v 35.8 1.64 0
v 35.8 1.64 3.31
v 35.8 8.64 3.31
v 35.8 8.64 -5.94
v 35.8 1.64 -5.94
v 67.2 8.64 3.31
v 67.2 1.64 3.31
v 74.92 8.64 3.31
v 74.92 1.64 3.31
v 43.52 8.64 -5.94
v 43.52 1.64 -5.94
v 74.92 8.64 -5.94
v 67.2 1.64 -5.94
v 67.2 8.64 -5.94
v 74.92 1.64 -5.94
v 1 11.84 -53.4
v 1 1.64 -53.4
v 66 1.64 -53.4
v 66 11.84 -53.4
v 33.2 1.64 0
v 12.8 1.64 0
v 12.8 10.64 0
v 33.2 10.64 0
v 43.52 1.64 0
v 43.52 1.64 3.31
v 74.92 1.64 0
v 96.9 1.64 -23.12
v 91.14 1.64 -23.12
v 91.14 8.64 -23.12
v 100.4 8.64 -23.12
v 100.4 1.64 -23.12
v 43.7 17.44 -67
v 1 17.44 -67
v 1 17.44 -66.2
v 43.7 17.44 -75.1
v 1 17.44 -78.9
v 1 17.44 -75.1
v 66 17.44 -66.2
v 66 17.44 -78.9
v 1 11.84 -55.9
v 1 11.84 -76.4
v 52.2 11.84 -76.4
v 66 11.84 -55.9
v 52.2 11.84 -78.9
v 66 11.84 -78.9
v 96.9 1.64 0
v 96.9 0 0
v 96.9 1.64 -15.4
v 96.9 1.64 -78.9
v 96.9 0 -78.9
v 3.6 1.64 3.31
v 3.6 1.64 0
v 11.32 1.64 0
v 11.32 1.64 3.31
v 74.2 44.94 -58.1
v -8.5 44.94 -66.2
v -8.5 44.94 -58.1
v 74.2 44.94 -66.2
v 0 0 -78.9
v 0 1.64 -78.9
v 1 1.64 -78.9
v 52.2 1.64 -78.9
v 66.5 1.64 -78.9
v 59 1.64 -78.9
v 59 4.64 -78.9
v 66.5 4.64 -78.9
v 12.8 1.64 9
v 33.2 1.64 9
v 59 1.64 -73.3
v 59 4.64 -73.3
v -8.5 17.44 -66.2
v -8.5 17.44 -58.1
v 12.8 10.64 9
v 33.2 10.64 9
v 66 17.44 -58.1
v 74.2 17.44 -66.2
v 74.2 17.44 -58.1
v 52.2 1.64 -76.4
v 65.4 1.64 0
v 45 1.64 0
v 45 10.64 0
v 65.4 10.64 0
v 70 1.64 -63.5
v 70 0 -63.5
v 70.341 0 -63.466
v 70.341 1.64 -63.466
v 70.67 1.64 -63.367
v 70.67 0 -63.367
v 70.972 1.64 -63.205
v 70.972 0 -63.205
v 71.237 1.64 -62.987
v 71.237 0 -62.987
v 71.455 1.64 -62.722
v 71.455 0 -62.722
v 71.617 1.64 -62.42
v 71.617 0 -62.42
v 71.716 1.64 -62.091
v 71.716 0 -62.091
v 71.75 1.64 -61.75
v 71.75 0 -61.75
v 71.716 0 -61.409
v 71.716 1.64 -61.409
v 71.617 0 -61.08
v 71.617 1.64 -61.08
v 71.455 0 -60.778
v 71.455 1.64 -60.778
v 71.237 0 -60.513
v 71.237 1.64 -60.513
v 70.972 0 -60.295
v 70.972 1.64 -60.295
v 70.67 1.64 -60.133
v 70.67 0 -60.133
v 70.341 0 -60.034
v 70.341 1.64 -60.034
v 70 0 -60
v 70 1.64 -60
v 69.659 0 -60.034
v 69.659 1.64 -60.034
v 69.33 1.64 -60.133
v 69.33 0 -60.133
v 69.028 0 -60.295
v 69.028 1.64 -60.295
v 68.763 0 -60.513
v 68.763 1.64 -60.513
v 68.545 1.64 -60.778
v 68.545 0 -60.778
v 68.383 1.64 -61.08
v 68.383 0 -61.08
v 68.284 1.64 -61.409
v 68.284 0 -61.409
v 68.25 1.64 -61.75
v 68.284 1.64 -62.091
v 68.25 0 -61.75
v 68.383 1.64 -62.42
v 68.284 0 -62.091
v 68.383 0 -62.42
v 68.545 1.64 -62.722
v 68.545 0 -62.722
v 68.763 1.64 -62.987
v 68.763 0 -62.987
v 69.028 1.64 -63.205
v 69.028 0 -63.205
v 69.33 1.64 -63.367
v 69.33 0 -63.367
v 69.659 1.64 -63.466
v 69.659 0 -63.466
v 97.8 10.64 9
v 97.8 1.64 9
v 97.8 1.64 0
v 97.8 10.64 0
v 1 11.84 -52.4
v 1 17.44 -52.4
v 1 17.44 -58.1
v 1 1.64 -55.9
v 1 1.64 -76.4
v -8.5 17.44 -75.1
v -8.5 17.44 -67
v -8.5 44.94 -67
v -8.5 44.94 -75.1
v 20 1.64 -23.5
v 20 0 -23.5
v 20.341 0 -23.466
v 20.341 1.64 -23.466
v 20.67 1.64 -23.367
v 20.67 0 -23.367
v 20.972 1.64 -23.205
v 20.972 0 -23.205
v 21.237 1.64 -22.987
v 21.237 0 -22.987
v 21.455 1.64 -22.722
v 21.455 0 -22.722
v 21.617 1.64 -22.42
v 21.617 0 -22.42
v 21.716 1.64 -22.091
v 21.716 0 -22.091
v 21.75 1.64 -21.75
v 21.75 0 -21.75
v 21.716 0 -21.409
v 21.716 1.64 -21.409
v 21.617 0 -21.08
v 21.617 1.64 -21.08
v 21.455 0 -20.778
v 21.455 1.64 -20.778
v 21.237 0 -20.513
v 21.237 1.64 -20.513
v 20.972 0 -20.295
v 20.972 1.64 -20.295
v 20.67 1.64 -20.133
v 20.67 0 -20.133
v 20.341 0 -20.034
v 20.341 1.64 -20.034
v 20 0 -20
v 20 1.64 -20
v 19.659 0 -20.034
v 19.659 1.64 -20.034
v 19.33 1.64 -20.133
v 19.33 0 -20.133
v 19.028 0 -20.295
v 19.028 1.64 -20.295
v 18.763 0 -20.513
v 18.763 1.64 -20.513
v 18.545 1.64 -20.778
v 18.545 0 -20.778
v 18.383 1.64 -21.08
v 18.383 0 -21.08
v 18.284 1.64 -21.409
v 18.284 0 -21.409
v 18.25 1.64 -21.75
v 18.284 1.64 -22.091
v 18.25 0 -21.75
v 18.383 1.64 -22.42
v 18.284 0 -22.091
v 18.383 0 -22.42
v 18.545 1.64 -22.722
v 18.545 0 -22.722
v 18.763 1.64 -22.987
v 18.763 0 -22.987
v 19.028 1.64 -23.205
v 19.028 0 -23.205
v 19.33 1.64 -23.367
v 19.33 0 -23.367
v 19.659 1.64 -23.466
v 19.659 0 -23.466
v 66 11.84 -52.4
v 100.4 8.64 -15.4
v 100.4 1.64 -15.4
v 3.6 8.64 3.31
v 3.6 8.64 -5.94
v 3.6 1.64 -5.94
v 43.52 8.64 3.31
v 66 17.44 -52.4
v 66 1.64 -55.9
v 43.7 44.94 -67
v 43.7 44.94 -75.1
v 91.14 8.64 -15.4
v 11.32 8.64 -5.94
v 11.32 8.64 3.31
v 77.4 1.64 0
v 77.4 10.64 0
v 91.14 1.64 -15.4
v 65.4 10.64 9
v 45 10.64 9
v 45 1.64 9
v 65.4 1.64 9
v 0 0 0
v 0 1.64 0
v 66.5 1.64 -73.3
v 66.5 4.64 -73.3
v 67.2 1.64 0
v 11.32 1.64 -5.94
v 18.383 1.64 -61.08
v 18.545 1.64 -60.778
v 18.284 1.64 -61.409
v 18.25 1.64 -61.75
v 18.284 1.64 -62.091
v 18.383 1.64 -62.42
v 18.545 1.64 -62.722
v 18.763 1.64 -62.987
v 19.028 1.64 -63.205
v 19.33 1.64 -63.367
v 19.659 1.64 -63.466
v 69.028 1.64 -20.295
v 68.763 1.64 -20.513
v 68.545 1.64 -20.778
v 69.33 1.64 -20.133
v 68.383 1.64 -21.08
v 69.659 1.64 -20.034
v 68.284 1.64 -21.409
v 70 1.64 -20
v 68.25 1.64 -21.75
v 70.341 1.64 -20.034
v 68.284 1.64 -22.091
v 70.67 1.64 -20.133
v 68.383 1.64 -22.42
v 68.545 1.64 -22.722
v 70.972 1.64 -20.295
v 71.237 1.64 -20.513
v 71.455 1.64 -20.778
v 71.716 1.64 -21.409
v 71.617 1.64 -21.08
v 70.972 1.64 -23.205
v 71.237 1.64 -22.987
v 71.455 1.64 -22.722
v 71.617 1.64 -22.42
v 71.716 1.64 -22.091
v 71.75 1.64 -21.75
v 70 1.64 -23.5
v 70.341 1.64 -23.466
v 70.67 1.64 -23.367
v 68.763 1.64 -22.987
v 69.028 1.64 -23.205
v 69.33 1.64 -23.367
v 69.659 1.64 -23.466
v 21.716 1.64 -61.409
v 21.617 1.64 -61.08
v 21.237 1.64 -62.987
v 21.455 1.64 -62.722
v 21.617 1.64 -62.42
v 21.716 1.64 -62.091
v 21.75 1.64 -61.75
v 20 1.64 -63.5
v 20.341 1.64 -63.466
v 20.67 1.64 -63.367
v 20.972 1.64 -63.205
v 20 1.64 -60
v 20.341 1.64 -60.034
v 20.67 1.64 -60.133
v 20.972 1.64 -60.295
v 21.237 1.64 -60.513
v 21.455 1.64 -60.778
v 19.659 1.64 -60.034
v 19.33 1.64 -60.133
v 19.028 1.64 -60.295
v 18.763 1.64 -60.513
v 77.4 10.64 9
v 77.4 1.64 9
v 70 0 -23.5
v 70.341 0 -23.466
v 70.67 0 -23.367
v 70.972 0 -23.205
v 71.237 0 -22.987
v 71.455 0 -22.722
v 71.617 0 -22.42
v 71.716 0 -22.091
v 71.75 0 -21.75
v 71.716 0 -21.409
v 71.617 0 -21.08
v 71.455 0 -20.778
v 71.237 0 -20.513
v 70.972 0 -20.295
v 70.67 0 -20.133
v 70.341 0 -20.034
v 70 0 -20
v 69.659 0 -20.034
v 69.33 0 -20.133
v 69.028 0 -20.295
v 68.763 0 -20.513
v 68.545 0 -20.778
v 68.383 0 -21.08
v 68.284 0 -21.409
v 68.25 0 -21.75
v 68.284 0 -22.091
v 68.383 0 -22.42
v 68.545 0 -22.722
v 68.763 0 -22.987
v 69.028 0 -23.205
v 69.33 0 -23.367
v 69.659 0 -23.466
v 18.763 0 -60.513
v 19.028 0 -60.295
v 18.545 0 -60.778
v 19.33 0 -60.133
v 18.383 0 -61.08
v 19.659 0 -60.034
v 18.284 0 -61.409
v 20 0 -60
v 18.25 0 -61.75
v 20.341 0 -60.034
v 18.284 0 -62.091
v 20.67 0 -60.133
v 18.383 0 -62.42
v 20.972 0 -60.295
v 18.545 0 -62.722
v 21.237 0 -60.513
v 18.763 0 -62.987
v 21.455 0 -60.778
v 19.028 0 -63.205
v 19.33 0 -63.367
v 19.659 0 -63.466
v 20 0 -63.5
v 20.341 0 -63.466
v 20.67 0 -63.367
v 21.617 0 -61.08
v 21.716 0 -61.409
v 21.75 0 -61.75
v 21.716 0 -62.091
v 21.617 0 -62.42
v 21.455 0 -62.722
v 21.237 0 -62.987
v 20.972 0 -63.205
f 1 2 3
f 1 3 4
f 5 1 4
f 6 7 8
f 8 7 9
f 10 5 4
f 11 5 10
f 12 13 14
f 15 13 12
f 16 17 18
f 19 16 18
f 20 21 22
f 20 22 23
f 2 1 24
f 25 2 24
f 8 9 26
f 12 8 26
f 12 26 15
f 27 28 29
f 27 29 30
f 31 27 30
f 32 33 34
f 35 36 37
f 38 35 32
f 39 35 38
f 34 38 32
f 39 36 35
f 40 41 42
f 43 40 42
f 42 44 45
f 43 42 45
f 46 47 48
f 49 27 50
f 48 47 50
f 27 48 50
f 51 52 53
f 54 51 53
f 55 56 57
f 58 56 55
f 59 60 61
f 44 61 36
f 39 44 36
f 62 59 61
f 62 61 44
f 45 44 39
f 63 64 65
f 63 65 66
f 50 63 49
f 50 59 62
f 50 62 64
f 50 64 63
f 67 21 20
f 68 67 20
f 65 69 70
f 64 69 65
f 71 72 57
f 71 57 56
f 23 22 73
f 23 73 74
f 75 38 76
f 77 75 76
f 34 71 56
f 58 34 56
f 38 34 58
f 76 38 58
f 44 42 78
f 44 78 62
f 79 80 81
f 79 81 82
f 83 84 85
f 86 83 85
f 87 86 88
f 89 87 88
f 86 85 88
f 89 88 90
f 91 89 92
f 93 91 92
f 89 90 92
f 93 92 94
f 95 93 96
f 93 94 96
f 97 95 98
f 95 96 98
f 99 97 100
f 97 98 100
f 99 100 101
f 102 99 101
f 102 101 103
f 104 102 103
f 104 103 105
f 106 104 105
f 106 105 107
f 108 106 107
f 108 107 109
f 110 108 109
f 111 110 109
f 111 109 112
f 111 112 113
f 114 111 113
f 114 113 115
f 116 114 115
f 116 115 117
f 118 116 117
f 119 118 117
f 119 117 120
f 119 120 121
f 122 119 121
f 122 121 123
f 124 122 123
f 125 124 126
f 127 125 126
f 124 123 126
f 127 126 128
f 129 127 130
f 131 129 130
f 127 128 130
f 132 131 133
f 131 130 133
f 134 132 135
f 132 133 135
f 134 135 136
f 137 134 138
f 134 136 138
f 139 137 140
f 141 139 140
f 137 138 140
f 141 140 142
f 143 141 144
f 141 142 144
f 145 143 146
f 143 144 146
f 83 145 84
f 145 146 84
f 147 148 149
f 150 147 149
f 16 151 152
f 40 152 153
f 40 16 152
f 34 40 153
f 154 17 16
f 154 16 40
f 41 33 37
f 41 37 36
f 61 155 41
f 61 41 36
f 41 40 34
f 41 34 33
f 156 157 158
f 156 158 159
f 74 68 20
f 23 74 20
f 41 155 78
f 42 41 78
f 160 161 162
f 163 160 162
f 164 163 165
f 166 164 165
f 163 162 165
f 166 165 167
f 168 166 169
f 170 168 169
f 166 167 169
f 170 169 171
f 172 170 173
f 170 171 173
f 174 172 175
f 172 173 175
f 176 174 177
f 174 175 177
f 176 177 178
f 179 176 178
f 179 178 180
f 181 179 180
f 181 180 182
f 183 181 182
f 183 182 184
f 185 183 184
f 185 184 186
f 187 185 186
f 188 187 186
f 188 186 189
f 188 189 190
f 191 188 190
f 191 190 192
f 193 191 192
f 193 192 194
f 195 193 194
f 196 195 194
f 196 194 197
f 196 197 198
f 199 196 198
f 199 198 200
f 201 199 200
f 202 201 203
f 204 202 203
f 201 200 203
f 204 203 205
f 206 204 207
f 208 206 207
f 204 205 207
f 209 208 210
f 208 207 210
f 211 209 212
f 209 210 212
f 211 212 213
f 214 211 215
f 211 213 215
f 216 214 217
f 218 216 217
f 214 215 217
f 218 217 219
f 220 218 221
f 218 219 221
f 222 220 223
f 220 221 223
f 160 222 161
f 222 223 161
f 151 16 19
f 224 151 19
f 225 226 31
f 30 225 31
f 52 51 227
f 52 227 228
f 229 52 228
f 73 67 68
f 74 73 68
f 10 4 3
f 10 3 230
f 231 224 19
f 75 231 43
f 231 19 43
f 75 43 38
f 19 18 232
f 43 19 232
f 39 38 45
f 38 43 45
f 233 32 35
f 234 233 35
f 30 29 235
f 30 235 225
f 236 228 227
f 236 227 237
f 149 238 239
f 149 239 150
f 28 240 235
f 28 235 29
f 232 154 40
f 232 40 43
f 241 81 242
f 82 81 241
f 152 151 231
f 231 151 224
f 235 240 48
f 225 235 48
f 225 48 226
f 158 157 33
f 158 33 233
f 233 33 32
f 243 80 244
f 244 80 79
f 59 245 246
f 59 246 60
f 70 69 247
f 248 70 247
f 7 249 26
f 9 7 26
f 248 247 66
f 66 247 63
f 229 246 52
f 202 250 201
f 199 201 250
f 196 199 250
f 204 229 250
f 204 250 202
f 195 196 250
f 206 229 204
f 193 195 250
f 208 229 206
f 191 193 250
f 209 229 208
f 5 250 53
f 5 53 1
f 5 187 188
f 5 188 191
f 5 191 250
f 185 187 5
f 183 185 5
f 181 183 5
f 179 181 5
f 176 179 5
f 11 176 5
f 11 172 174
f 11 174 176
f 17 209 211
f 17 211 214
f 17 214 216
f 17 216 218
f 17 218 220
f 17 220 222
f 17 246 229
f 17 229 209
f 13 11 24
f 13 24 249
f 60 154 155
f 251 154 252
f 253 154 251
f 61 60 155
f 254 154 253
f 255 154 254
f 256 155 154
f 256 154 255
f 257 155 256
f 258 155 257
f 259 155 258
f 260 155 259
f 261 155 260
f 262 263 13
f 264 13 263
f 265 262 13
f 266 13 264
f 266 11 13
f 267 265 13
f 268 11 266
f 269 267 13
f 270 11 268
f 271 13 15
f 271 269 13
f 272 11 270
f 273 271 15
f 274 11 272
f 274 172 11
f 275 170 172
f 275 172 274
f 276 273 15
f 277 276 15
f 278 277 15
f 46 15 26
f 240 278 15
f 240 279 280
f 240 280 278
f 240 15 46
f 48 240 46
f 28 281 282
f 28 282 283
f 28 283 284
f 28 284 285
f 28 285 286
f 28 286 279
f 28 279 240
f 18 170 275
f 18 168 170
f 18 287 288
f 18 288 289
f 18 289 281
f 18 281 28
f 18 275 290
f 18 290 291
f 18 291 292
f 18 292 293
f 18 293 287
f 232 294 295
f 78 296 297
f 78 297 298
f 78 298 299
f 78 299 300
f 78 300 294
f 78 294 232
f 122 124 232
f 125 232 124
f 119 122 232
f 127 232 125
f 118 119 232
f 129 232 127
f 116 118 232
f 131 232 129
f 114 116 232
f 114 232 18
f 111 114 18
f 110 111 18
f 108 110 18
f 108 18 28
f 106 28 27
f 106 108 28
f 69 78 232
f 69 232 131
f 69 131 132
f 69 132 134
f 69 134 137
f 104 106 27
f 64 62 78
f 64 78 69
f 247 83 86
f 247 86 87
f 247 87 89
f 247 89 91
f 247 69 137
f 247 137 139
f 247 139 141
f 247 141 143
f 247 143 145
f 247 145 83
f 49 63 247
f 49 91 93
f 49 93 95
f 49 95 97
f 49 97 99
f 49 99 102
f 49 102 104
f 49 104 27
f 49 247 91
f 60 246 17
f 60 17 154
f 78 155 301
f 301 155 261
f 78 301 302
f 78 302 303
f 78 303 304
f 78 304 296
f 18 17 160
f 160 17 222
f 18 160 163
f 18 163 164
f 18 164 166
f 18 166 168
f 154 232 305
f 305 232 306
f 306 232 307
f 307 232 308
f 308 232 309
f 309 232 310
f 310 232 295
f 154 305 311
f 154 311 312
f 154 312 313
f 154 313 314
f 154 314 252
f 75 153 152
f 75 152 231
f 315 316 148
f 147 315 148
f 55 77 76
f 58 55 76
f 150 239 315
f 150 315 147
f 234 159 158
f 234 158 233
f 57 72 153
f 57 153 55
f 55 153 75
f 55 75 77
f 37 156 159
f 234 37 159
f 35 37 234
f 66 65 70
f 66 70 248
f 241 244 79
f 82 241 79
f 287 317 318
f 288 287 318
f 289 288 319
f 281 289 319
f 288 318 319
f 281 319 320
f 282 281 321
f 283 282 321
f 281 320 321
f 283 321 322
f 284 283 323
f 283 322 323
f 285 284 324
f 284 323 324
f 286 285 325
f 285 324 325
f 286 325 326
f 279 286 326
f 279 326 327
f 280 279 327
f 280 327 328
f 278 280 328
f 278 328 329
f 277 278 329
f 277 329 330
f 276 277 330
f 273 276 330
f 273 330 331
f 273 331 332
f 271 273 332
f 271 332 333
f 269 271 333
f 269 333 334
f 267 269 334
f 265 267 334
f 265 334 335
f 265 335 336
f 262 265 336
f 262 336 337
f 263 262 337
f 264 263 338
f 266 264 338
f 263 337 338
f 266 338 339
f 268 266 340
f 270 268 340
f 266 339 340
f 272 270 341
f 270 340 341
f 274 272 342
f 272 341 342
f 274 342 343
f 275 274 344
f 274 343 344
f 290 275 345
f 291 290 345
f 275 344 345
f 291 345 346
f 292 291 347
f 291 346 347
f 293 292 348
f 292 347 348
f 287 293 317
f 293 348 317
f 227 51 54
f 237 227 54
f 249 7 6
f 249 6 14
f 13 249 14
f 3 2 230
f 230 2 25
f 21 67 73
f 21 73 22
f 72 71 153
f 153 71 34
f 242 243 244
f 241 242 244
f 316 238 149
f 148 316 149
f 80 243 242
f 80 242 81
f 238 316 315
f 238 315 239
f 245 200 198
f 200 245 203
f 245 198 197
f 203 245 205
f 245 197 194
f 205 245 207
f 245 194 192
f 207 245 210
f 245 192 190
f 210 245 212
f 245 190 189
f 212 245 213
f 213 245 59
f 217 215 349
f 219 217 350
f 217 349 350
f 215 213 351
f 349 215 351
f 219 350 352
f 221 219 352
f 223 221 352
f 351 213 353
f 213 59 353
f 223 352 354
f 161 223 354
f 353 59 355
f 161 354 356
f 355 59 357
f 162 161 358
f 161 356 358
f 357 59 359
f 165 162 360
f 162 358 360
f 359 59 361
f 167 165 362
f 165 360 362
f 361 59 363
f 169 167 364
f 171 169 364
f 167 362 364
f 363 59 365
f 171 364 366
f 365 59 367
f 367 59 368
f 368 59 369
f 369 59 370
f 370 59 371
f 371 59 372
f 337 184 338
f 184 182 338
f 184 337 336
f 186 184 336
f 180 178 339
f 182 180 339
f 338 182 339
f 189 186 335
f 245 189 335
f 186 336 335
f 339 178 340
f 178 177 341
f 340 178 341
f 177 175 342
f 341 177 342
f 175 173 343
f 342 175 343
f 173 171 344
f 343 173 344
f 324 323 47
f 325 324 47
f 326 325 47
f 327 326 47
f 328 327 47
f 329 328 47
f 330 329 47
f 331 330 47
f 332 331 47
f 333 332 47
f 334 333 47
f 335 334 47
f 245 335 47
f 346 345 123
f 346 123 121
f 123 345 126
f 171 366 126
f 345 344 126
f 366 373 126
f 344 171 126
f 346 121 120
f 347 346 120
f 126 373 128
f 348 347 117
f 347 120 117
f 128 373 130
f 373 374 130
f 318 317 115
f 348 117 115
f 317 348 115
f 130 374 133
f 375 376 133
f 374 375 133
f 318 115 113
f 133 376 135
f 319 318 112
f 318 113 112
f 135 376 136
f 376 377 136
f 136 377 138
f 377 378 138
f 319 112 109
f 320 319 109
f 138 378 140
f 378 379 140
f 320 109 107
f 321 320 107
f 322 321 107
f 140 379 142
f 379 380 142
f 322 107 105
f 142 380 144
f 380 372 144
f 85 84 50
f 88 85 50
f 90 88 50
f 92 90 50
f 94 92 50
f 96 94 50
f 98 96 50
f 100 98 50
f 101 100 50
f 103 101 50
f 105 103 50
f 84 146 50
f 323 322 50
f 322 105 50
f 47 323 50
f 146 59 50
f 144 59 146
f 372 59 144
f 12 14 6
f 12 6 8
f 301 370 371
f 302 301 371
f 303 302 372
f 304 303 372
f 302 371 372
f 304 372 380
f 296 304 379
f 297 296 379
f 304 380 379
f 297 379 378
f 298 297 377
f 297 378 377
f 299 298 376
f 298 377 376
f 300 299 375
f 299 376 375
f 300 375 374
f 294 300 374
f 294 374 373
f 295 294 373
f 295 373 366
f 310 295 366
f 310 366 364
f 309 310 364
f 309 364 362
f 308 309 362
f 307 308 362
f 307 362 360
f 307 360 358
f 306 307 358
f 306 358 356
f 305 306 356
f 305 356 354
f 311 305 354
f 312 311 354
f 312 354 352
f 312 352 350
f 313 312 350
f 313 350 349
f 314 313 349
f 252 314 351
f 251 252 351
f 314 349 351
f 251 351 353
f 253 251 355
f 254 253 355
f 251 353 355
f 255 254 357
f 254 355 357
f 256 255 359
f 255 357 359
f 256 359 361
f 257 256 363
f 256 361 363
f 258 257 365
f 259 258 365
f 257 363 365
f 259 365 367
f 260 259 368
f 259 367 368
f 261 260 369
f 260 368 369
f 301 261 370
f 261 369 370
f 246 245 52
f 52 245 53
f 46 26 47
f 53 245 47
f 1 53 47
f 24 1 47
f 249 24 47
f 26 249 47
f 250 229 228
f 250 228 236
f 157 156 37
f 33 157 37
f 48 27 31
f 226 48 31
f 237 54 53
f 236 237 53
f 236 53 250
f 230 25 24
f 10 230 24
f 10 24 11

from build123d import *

# Parameters (mm, degrees)
SKETCH1_W             = 96.9
SKETCH1_H             = 78.9
BOSS_EXTRUDE1_DEPTH   = 1.64
SKETCH2_W             = 7.72
SKETCH2_H             = 9.25
SKETCH2_W_2           = 9.26
SKETCH2_H_2           = 7.72
BOSS_EXTRUDE2_DEPTH   = 7
SKETCH3_W             = 20.4
SKETCH3_H             = 9
BOSS_EXTRUDE5_DEPTH   = 9
BOSS_EXTRUDE5_2_DEPTH = 9
BOSS_EXTRUDE5_3_DEPTH = 9
SKETCH4_W             = 7.5
SKETCH4_H             = 5.6
BOSS_EXTRUDE6_DEPTH   = 3
SKETCH6_W             = 51.2
SKETCH6_H             = 2.5
SKETCH6_W_2           = 65
BOSS_EXTRUDE7_DEPTH   = 10.2
SKETCH7_W             = 65
SKETCH7_H             = 26.5
BOSS_EXTRUDE8_DEPTH   = 5.6
SKETCH8_W             = 52.2
SKETCH8_H             = 8.1
SKETCH8_W_2           = 82.7
BOSS_EXTRUDE9_DEPTH   = 27.5
SKETCH10_R            = 1.75
CUT_EXTRUDE1_DEPTH    = 2


with BuildPart() as part:
    # Sketch1 → Boss-Extrude1 (new body)
    with BuildSketch(Plane(origin=(0, 0, 0), x_dir=(1, 0, 0), z_dir=(0, 1, 0))):
        with Locations((48.45, 39.45)):
            Rectangle(SKETCH1_W, SKETCH1_H)
    extrude(amount=BOSS_EXTRUDE1_DEPTH)

    # Sketch2 → Boss-Extrude2 (add)
    with BuildSketch(Plane(origin=(0, 1.64, 0), x_dir=(1, 0, 0), z_dir=(0, 1, 0))):
        with Locations((39.66, 1.315)):
            Rectangle(SKETCH2_W, SKETCH2_H)
        with Locations((7.46, 1.315)):
            Rectangle(SKETCH2_W, SKETCH2_H)
        with Locations((71.06, 1.315)):
            Rectangle(SKETCH2_W, SKETCH2_H)
        with Locations((95.77, 19.26)):
            Rectangle(SKETCH2_W_2, SKETCH2_H_2)
    extrude(amount=BOSS_EXTRUDE2_DEPTH)

    # Sketch4 → Boss-Extrude6 (add)
    with BuildSketch(Plane(origin=(0, 1.64, 0), x_dir=(1, 0, 0), z_dir=(0, 1, 0))):
        with Locations((62.75, 76.1)):
            Rectangle(SKETCH4_W, SKETCH4_H)
    extrude(amount=BOSS_EXTRUDE6_DEPTH)

    # Sketch6 → Boss-Extrude7 (add)
    with BuildSketch(Plane(origin=(0, 1.64, 0), x_dir=(1, 0, 0), z_dir=(0, 1, 0))):
        with Locations((26.6, 77.65)):
            Rectangle(SKETCH6_W, SKETCH6_H)
        with Locations((33.5, 54.65)):
            Rectangle(SKETCH6_W_2, SKETCH6_H)
    extrude(amount=BOSS_EXTRUDE7_DEPTH)

    # Sketch7 → Boss-Extrude8 (add)
    with BuildSketch(Plane(origin=(0, 11.84, 0), x_dir=(1, 0, 0), z_dir=(0, 1, 0))):
        with Locations((33.5, 65.65)):
            Rectangle(SKETCH7_W, SKETCH7_H)
    extrude(amount=BOSS_EXTRUDE8_DEPTH)

    # Sketch8 → Boss-Extrude9 (add)
    with BuildSketch(Plane(origin=(0, 17.44, 0), x_dir=(1, 0, 0), z_dir=(0, 1, 0))):
        with Locations((17.6, 71.05)):
            Rectangle(SKETCH8_W, SKETCH8_H)
        with Locations((32.85, 62.15)):
            Rectangle(SKETCH8_W_2, SKETCH8_H)
    extrude(amount=BOSS_EXTRUDE9_DEPTH)

    # Sketch10 → Cut-Extrude1 (cut)
    with BuildSketch(Plane.XZ):
        with Locations(Location((20, -21.75, 0), (0, 0, 270))):
            Circle(SKETCH10_R)
        with Locations(Location((70, -21.75, 0), (0, 0, 270))):
            Circle(SKETCH10_R)
        with Locations(Location((20, -61.75, 0), (0, 0, 270))):
            Circle(SKETCH10_R)
        with Locations(Location((70, -61.75, 0), (0, 0, 270))):
            Circle(SKETCH10_R)
    extrude(amount=-CUT_EXTRUDE1_DEPTH, mode=Mode.SUBTRACT)


with BuildPart() as body_2:
    # Sketch3 → Boss-Extrude5 (new body)
    with BuildSketch(Plane(origin=(0, 1.64, 0), x_dir=(1, 0, 0), z_dir=(0, 1, 0))):
        with Locations((23, -4.5)):
            Rectangle(SKETCH3_W, SKETCH3_H)
    extrude(amount=BOSS_EXTRUDE5_DEPTH)


with BuildPart() as body_3:
    # Sketch3 → Boss-Extrude5 2 (new body)
    with BuildSketch(Plane(origin=(0, 1.64, 0), x_dir=(1, 0, 0), z_dir=(0, 1, 0))):
        with Locations((55.2, -4.5)):
            Rectangle(SKETCH3_W, SKETCH3_H)
    extrude(amount=BOSS_EXTRUDE5_2_DEPTH)


with BuildPart() as body_4:
    # Sketch3 → Boss-Extrude5 3 (new body)
    with BuildSketch(Plane(origin=(0, 1.64, 0), x_dir=(1, 0, 0), z_dir=(0, 1, 0))):
        with Locations((87.6, -4.5)):
            Rectangle(SKETCH3_W, SKETCH3_H)
    extrude(amount=BOSS_EXTRUDE5_3_DEPTH)


solid = Compound([part.part, body_2.part, body_3.part, body_4.part])
